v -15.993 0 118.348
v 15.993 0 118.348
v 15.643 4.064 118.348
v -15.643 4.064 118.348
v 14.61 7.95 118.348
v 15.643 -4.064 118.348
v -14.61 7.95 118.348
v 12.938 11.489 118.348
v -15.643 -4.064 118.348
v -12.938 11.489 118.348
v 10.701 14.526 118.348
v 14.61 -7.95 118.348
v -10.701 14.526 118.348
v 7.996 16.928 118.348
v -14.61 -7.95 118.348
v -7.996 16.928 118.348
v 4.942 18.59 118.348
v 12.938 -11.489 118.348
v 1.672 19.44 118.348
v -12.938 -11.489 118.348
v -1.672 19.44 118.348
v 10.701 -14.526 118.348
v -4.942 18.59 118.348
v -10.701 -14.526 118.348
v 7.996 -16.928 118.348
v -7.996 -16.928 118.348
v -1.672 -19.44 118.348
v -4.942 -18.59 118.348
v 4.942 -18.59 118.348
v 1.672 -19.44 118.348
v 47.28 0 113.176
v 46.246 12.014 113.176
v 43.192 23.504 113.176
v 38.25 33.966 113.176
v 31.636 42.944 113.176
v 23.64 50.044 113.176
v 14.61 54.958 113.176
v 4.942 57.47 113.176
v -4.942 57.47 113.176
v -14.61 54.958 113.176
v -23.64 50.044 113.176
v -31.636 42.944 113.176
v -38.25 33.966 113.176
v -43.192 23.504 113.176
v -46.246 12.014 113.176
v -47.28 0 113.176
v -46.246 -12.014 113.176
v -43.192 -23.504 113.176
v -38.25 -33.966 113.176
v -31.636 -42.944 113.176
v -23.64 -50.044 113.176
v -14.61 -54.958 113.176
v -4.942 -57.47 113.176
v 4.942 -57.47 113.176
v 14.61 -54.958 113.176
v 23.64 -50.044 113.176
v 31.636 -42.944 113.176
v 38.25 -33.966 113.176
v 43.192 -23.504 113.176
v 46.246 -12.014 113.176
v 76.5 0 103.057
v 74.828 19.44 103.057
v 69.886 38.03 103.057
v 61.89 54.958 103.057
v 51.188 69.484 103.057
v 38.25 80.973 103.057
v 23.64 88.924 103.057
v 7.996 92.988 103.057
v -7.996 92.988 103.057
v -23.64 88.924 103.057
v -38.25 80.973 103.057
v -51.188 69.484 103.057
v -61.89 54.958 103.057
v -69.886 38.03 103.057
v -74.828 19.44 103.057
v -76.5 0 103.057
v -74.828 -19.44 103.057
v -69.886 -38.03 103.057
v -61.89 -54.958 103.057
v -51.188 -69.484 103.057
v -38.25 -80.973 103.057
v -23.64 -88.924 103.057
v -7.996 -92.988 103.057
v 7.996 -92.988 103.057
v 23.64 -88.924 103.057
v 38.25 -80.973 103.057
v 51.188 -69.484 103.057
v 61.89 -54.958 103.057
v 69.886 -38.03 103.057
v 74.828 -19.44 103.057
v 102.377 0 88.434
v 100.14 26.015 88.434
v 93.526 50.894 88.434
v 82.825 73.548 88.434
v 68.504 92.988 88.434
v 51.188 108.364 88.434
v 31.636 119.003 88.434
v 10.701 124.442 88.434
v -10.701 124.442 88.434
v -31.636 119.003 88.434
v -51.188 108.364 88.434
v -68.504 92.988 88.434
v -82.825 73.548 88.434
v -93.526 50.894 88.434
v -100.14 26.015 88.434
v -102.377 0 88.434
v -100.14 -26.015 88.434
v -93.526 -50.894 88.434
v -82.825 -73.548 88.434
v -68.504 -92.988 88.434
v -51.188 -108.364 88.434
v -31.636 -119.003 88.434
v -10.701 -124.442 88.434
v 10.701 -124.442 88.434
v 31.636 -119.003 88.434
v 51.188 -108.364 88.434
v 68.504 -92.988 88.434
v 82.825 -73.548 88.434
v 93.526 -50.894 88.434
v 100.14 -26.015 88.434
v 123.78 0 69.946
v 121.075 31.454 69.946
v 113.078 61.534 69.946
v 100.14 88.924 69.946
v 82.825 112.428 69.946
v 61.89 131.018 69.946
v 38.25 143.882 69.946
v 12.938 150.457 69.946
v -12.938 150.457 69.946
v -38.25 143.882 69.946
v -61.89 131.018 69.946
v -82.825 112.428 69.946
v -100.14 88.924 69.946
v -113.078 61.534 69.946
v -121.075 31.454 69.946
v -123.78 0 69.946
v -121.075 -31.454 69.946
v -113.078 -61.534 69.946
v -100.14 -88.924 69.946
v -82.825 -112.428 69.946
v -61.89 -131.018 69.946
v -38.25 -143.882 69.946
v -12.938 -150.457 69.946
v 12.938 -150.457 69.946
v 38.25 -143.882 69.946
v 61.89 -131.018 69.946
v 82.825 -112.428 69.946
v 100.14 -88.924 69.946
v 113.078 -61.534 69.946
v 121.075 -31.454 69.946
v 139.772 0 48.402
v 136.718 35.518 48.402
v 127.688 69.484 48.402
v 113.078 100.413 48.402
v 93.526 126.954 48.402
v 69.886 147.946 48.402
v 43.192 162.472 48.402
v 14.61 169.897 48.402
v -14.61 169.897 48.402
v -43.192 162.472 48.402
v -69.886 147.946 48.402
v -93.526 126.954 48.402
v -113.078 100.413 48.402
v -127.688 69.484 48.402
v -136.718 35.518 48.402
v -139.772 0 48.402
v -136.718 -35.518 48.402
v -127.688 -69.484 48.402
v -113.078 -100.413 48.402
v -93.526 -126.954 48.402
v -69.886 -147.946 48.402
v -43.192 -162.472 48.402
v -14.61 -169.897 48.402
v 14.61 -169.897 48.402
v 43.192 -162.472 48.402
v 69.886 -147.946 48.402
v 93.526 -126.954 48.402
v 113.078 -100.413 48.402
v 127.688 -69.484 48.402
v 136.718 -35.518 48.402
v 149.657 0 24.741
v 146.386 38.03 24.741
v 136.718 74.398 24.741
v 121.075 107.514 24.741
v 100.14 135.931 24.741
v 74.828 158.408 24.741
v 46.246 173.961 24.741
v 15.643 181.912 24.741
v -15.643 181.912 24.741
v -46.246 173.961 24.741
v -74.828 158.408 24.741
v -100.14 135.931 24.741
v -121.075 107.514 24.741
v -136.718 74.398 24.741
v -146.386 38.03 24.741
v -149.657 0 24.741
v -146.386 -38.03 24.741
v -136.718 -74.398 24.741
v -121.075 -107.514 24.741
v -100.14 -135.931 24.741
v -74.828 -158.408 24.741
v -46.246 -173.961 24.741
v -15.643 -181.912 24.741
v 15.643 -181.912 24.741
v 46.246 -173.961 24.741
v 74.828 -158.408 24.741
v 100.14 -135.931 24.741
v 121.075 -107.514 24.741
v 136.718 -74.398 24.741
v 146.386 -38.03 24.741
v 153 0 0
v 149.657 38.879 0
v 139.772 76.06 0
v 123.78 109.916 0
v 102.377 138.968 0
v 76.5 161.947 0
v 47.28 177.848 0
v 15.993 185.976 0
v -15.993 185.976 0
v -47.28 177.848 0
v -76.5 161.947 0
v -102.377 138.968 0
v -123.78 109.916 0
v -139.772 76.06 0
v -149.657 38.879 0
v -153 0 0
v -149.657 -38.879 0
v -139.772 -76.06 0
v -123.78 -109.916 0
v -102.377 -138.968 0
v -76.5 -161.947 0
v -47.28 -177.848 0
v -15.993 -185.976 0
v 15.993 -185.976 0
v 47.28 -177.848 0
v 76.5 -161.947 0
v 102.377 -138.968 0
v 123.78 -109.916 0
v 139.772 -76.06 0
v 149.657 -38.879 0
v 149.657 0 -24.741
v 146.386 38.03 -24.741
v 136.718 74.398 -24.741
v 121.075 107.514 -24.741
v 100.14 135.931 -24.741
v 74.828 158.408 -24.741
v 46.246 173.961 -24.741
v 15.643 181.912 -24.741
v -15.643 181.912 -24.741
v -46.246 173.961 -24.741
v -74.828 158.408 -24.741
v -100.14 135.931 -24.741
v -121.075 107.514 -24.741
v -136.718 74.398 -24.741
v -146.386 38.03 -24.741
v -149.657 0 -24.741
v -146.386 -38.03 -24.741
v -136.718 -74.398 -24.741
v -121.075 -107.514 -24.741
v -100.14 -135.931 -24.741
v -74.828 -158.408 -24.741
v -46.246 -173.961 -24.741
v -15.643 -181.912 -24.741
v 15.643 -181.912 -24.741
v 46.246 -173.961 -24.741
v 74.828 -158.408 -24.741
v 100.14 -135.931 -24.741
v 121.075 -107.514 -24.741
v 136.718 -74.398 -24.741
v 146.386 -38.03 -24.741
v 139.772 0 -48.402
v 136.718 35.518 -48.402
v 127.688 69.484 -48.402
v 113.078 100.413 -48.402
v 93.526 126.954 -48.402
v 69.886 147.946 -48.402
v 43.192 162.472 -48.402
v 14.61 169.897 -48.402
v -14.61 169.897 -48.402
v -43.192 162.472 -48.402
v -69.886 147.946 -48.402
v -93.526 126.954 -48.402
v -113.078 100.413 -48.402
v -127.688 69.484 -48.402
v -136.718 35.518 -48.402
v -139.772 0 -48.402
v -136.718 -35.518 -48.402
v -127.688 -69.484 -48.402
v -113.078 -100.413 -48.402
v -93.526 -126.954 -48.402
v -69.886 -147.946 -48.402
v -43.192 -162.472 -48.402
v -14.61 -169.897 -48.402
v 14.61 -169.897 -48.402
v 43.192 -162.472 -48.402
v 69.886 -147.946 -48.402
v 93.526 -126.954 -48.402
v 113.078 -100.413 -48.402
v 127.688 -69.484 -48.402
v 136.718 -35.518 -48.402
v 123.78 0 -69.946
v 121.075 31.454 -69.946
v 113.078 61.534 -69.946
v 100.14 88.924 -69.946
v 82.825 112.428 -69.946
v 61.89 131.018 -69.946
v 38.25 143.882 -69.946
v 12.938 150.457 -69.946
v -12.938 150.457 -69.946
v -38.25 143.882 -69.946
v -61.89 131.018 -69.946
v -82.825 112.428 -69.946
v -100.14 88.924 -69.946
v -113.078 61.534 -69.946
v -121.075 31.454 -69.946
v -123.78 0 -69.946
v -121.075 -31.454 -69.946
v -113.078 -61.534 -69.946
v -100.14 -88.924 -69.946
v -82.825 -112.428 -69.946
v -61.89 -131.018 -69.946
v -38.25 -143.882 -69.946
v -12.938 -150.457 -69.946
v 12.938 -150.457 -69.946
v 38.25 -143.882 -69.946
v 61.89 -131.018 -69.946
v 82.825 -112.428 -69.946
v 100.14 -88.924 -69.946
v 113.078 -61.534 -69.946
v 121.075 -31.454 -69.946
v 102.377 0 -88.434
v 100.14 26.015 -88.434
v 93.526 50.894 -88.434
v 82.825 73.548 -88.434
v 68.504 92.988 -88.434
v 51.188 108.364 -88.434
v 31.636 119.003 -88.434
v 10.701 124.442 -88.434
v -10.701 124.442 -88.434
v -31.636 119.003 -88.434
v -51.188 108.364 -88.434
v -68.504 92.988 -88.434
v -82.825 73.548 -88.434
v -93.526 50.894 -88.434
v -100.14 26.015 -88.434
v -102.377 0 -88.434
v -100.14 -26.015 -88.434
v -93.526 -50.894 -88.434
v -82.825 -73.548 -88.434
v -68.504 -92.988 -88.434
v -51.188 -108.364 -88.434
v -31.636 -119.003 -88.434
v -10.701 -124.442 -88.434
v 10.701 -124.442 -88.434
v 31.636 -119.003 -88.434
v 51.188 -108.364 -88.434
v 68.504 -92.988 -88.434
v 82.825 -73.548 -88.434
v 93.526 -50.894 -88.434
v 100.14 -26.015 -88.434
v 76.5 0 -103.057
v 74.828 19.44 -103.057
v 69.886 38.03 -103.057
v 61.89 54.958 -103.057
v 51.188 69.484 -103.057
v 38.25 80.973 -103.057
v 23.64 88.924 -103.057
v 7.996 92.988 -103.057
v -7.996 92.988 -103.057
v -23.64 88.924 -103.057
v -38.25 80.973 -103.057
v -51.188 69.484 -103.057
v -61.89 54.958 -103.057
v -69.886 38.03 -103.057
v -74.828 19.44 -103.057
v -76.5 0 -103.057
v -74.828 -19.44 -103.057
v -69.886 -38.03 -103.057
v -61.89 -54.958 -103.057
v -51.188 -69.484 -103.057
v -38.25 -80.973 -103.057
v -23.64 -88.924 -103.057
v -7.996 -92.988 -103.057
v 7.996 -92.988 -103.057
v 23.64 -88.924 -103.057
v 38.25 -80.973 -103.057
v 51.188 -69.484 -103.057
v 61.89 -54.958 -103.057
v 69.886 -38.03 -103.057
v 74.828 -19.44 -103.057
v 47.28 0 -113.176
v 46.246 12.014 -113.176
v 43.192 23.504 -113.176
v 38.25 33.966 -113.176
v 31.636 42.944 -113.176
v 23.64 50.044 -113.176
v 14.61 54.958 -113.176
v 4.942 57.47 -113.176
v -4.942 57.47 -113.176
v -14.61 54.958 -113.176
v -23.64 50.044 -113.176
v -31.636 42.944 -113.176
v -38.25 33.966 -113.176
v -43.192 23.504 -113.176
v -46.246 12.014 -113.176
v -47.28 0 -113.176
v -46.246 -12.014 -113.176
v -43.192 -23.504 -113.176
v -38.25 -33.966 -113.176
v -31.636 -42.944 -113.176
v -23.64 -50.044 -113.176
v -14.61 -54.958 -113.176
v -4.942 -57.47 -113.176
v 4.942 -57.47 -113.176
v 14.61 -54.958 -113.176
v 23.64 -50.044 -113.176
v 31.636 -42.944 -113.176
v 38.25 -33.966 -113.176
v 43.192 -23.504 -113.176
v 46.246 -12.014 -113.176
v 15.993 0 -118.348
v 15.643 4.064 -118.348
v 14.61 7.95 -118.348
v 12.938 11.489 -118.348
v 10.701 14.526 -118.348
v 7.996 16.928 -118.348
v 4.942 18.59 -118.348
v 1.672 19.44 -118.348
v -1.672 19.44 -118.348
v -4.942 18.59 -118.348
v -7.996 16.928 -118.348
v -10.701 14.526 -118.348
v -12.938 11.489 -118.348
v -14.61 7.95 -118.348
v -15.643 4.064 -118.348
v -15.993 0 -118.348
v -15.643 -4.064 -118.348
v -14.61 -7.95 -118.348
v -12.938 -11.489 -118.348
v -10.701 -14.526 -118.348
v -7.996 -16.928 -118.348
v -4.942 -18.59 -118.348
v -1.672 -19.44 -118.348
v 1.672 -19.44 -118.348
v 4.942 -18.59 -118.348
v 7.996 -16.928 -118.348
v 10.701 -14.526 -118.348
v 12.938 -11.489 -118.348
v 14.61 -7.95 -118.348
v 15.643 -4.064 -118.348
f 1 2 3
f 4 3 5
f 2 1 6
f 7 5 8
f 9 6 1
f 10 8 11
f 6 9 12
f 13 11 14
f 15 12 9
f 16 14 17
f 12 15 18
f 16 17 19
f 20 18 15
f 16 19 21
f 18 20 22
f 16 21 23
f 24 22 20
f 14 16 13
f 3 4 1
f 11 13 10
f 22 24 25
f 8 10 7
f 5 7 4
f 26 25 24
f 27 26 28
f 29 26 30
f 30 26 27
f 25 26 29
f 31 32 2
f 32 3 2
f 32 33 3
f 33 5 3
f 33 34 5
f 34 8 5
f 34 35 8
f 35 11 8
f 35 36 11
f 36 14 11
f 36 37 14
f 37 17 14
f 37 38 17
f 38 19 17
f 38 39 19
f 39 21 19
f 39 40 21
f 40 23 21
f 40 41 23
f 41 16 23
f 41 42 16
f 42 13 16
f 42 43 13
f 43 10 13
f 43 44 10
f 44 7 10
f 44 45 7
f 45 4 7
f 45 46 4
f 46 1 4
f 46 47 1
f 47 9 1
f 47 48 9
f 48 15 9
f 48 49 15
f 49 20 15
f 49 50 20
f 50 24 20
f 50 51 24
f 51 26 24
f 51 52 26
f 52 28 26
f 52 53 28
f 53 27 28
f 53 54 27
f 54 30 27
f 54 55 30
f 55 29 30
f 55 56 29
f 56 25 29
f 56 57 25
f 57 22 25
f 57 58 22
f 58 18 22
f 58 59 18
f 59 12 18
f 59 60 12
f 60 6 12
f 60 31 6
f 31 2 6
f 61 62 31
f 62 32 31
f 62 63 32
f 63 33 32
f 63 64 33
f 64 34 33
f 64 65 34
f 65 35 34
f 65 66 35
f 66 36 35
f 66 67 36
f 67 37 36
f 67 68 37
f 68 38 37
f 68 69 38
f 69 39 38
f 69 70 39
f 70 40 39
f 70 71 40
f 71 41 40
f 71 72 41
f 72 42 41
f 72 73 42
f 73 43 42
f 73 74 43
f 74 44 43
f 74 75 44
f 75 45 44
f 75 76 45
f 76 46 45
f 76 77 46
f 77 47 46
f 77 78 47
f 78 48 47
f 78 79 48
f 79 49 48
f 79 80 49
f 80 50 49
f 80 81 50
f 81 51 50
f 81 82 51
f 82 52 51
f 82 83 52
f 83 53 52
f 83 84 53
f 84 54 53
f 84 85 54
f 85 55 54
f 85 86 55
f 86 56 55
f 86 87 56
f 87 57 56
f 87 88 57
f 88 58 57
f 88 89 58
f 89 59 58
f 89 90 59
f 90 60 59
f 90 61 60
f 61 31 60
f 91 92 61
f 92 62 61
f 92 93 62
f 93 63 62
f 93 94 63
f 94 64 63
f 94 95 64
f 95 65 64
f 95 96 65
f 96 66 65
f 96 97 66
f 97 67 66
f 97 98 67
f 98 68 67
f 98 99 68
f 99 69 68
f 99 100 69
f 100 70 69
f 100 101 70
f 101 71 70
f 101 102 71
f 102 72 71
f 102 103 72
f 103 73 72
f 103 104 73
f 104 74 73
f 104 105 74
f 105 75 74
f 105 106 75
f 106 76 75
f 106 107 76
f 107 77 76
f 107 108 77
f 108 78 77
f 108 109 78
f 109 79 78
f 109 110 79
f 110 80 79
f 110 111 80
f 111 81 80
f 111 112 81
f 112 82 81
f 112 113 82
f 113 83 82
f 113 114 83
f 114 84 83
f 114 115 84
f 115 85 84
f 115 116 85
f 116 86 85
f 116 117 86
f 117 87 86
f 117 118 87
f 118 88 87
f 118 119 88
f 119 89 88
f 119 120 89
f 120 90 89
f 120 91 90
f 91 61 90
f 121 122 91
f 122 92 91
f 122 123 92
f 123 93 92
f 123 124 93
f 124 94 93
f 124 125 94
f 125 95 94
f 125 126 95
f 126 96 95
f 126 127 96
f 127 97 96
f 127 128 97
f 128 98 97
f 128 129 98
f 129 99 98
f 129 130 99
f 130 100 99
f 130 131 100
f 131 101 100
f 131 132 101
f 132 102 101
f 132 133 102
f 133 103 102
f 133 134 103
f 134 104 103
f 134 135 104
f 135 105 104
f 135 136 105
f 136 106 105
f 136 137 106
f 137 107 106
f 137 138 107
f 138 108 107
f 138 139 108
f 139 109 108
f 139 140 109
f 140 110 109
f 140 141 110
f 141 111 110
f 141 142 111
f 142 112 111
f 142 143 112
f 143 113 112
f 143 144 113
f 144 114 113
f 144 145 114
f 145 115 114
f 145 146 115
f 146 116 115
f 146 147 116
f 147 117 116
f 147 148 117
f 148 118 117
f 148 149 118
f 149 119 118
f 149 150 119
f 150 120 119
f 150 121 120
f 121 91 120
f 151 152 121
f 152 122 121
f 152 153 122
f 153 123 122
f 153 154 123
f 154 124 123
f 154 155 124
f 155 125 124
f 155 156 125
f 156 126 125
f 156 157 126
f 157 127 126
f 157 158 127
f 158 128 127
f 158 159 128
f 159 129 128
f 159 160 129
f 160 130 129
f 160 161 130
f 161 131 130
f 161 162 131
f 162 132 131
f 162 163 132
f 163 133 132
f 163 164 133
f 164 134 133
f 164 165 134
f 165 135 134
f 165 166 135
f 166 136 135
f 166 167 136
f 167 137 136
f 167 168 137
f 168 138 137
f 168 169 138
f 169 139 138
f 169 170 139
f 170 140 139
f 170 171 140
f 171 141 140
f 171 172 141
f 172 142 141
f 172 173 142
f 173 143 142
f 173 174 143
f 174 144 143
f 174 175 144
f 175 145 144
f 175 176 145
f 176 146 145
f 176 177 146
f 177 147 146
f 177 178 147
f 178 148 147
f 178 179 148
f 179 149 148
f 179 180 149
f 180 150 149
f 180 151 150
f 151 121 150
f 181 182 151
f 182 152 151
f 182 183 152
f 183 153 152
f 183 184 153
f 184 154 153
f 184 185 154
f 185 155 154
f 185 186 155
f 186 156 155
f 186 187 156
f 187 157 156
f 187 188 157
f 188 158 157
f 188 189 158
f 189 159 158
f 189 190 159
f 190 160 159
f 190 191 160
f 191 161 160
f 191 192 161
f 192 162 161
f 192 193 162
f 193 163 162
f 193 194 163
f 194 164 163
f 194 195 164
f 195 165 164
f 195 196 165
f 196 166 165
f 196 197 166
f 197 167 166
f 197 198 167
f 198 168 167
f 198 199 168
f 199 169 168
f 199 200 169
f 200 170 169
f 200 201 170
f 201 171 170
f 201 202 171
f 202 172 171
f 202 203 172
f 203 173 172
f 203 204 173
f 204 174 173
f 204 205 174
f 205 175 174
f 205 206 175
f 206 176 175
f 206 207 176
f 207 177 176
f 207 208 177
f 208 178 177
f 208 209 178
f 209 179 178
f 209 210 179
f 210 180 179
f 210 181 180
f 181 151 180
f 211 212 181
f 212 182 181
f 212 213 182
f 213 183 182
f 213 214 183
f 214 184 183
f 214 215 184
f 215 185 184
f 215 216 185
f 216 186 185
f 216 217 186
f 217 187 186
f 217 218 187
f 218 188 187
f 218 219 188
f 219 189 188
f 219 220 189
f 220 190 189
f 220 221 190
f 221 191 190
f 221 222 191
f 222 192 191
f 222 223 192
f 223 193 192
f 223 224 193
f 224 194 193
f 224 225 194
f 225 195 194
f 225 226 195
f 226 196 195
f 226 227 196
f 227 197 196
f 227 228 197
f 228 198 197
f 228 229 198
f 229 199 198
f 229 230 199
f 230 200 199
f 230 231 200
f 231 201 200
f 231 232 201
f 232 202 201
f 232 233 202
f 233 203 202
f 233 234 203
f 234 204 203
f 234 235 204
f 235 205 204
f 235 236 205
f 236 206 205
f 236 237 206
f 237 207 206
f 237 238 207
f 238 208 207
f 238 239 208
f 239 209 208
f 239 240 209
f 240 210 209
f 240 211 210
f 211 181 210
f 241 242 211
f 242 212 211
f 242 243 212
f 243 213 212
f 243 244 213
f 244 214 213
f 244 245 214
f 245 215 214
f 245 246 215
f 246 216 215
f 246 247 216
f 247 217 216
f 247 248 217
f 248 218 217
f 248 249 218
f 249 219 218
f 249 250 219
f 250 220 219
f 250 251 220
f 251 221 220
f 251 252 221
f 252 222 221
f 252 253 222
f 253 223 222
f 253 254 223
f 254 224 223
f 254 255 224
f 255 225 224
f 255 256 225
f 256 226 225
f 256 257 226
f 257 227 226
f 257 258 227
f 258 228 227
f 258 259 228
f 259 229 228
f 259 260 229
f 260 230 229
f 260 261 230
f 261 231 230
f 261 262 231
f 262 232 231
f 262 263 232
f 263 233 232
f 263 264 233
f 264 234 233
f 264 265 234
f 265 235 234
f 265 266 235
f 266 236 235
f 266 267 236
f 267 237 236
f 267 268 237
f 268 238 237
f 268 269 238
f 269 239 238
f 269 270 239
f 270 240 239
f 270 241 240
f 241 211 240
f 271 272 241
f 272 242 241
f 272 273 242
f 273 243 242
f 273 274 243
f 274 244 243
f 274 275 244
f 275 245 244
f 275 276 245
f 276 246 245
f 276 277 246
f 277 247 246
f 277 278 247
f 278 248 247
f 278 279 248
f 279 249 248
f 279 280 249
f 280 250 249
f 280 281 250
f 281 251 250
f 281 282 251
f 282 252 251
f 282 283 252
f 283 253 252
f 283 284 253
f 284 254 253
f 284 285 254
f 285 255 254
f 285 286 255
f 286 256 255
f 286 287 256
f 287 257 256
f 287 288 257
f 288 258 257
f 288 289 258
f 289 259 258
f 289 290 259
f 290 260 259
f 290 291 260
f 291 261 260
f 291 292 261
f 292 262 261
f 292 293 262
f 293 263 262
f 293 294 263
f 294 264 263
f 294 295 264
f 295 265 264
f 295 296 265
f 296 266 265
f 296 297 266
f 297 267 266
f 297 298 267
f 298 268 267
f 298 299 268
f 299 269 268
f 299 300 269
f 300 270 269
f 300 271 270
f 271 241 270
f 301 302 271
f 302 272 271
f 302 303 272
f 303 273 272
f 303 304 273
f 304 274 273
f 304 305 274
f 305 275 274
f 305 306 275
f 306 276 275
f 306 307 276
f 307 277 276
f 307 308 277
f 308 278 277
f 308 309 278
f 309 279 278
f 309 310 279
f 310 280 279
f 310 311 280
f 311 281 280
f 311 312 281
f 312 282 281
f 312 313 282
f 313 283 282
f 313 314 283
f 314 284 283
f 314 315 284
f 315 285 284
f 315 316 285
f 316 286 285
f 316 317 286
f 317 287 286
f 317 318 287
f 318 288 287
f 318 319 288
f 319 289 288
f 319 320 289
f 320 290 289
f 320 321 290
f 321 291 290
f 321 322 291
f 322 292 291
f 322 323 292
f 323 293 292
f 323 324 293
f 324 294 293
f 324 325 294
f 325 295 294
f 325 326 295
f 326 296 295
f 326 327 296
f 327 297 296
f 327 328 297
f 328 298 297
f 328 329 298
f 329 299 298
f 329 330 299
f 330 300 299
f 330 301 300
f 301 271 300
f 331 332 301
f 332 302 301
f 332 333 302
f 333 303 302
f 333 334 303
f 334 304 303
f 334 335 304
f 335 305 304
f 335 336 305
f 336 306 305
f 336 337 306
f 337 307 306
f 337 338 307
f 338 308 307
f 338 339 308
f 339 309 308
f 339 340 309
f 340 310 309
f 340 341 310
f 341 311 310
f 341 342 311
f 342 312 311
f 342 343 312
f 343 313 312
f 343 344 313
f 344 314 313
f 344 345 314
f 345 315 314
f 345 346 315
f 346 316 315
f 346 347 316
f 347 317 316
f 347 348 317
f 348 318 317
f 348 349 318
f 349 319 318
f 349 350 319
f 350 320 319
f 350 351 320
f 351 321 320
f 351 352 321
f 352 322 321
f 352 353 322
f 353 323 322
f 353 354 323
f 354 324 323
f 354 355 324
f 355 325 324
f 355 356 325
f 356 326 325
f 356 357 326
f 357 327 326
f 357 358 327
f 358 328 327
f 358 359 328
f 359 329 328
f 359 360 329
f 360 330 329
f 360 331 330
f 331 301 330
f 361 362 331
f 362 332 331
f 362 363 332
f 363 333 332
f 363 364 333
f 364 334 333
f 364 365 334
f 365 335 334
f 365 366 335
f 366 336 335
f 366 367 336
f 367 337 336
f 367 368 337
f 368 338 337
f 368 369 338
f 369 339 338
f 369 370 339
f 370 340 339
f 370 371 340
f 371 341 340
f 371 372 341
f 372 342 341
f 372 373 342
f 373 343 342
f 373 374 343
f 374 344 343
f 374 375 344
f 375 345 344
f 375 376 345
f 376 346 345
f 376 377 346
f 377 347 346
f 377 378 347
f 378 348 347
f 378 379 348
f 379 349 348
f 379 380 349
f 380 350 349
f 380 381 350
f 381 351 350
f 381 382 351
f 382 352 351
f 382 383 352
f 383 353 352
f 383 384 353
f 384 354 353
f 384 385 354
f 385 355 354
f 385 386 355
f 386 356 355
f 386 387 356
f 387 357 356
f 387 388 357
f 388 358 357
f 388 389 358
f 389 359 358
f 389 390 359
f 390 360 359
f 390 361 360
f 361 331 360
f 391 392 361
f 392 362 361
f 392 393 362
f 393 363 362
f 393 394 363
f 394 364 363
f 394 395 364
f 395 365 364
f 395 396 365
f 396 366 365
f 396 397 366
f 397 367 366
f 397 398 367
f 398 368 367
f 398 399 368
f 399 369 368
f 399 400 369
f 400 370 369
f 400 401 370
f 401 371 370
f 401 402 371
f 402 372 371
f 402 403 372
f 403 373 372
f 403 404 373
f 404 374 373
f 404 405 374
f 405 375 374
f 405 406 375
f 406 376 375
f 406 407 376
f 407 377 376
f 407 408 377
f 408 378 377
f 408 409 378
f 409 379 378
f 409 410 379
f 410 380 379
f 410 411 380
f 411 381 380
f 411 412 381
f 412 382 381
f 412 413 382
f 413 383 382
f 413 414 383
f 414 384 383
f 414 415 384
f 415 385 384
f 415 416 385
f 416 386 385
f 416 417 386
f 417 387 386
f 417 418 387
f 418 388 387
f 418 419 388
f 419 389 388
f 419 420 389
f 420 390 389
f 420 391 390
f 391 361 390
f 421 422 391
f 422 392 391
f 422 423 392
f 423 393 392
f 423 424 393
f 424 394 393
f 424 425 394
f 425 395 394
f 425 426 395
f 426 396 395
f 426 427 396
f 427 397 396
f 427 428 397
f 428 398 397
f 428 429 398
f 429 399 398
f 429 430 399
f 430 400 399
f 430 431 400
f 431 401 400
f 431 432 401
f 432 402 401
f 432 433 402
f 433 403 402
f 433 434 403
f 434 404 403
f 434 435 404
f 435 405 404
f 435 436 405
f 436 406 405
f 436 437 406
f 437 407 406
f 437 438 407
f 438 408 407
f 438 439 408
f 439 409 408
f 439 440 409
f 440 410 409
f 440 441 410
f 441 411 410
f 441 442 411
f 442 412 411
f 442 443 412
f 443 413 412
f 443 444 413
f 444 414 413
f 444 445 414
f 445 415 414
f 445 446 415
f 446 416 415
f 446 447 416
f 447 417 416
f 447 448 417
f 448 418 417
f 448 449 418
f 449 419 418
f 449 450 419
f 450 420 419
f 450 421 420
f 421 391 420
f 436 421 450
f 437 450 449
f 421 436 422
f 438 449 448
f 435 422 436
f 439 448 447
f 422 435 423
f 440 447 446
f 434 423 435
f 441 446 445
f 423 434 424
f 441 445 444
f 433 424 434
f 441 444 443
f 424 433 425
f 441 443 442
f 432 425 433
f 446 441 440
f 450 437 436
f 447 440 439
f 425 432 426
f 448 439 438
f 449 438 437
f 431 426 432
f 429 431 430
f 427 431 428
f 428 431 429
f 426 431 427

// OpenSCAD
// Generated by SolidPython 1.0.1 on 2020-07-29 00:46:48


scale(v = [9, 11, 7]) {
	sphere(r = 17);
}
/***********************************************
*********      SolidPython code:      **********
************************************************
 
# import packages: SolidPython
from solid import *
from solid.utils import *
from itertools import chain, combinations, permutations


class Resize:

    def __init__(self, scad_file):
        self.scad_file = scad_file
        #self.scad_file = import_scad(scad_file)
        # cone/cylinder param:
        self.r1 = 0
        self.r2 = 0
        self.h = 0
        # rectangular prism param:
        self.w = 0
        self.l = 0
        # ellipse param:
        self.r = 0

    # import OpenScad code (file name corresponds to shape)


    # classify shape + parameters
    def assign(self, param1, param2, param3):
        if self.scad_file == 'cone.scad':
            self.r1 = param1
            self.r2 = param2
            self.h = param3
        elif self.scad_file == 'cylinder.scad':
            self.r1 = param1
            self.r2 = param2
            self.h = param3
        elif self.scad_file == 'rectangularPrism.scad':
            self.h = param1
            self.l = param2
            self.w = param3
        else:
            self.r = param1
            self.h = param2

    # resize parameters
    def iterate(self):
        x = range(3, 20, 2)
        i = 1
        if self.scad_file == 'cone.scad':
            tempList = list(permutations(x, 2))
            for temp in tempList:
                param1 = temp[0]
                param2 = temp[1]
                filepath = 'produced_scad_files/' + 'cone' + str(param1) + '_' + str(param2) + '_' + '.scad'
                scad_render_to_file(cylinder(h=param1, r1=param2, r2=0), filepath)

        elif self.scad_file == 'cylinder.scad':
            tempList = list(permutations(x, 3))
            for temp in tempList:
                param1 = temp[0]
                param2 = temp[1]
                filepath = 'produced_scad_files/' + 'cylinder' + str(param1) + '_' + str(param2) + '_' + '.scad'
                scad_render_to_file(cylinder(h=param1, r1=param2, r2=param2), filepath)

        elif self.scad_file == 'rectangularPrism.scad':
            tempList = list(permutations(x, 3))
            for temp in tempList:
                param1 = temp[0]
                param2 = temp[1]
                param3 = temp[2]
                filepath = 'produced_scad_files/' + 'rectangularPrism' + str(param1) + '_' + str(param2) + '_' + str(
                    param3) + '.scad'
                scad_render_to_file(cube(size=(param1, param2, param3)), filepath)

        elif self.scad_file == 'ellipse.scad':
            tempList = list(permutations(x, 4))
            for temp in tempList:
                param1 = temp[0]
                param2 = temp[1]
                param3 = temp[2]
                param4 = temp[3]
                filepath = 'produced_scad_files/' + 'ellipse' + str(param1) + '_' + str(param2) + '_' + str(param3) + '_' + str(param4) + '.scad'
                scad_render_to_file(scale([param1, param2, param3])(sphere(r=param4)), filepath)

    def render_to_scadfile(self):
        scad_render_to_file(scad, 'example.scad') 
 
************************************************/
